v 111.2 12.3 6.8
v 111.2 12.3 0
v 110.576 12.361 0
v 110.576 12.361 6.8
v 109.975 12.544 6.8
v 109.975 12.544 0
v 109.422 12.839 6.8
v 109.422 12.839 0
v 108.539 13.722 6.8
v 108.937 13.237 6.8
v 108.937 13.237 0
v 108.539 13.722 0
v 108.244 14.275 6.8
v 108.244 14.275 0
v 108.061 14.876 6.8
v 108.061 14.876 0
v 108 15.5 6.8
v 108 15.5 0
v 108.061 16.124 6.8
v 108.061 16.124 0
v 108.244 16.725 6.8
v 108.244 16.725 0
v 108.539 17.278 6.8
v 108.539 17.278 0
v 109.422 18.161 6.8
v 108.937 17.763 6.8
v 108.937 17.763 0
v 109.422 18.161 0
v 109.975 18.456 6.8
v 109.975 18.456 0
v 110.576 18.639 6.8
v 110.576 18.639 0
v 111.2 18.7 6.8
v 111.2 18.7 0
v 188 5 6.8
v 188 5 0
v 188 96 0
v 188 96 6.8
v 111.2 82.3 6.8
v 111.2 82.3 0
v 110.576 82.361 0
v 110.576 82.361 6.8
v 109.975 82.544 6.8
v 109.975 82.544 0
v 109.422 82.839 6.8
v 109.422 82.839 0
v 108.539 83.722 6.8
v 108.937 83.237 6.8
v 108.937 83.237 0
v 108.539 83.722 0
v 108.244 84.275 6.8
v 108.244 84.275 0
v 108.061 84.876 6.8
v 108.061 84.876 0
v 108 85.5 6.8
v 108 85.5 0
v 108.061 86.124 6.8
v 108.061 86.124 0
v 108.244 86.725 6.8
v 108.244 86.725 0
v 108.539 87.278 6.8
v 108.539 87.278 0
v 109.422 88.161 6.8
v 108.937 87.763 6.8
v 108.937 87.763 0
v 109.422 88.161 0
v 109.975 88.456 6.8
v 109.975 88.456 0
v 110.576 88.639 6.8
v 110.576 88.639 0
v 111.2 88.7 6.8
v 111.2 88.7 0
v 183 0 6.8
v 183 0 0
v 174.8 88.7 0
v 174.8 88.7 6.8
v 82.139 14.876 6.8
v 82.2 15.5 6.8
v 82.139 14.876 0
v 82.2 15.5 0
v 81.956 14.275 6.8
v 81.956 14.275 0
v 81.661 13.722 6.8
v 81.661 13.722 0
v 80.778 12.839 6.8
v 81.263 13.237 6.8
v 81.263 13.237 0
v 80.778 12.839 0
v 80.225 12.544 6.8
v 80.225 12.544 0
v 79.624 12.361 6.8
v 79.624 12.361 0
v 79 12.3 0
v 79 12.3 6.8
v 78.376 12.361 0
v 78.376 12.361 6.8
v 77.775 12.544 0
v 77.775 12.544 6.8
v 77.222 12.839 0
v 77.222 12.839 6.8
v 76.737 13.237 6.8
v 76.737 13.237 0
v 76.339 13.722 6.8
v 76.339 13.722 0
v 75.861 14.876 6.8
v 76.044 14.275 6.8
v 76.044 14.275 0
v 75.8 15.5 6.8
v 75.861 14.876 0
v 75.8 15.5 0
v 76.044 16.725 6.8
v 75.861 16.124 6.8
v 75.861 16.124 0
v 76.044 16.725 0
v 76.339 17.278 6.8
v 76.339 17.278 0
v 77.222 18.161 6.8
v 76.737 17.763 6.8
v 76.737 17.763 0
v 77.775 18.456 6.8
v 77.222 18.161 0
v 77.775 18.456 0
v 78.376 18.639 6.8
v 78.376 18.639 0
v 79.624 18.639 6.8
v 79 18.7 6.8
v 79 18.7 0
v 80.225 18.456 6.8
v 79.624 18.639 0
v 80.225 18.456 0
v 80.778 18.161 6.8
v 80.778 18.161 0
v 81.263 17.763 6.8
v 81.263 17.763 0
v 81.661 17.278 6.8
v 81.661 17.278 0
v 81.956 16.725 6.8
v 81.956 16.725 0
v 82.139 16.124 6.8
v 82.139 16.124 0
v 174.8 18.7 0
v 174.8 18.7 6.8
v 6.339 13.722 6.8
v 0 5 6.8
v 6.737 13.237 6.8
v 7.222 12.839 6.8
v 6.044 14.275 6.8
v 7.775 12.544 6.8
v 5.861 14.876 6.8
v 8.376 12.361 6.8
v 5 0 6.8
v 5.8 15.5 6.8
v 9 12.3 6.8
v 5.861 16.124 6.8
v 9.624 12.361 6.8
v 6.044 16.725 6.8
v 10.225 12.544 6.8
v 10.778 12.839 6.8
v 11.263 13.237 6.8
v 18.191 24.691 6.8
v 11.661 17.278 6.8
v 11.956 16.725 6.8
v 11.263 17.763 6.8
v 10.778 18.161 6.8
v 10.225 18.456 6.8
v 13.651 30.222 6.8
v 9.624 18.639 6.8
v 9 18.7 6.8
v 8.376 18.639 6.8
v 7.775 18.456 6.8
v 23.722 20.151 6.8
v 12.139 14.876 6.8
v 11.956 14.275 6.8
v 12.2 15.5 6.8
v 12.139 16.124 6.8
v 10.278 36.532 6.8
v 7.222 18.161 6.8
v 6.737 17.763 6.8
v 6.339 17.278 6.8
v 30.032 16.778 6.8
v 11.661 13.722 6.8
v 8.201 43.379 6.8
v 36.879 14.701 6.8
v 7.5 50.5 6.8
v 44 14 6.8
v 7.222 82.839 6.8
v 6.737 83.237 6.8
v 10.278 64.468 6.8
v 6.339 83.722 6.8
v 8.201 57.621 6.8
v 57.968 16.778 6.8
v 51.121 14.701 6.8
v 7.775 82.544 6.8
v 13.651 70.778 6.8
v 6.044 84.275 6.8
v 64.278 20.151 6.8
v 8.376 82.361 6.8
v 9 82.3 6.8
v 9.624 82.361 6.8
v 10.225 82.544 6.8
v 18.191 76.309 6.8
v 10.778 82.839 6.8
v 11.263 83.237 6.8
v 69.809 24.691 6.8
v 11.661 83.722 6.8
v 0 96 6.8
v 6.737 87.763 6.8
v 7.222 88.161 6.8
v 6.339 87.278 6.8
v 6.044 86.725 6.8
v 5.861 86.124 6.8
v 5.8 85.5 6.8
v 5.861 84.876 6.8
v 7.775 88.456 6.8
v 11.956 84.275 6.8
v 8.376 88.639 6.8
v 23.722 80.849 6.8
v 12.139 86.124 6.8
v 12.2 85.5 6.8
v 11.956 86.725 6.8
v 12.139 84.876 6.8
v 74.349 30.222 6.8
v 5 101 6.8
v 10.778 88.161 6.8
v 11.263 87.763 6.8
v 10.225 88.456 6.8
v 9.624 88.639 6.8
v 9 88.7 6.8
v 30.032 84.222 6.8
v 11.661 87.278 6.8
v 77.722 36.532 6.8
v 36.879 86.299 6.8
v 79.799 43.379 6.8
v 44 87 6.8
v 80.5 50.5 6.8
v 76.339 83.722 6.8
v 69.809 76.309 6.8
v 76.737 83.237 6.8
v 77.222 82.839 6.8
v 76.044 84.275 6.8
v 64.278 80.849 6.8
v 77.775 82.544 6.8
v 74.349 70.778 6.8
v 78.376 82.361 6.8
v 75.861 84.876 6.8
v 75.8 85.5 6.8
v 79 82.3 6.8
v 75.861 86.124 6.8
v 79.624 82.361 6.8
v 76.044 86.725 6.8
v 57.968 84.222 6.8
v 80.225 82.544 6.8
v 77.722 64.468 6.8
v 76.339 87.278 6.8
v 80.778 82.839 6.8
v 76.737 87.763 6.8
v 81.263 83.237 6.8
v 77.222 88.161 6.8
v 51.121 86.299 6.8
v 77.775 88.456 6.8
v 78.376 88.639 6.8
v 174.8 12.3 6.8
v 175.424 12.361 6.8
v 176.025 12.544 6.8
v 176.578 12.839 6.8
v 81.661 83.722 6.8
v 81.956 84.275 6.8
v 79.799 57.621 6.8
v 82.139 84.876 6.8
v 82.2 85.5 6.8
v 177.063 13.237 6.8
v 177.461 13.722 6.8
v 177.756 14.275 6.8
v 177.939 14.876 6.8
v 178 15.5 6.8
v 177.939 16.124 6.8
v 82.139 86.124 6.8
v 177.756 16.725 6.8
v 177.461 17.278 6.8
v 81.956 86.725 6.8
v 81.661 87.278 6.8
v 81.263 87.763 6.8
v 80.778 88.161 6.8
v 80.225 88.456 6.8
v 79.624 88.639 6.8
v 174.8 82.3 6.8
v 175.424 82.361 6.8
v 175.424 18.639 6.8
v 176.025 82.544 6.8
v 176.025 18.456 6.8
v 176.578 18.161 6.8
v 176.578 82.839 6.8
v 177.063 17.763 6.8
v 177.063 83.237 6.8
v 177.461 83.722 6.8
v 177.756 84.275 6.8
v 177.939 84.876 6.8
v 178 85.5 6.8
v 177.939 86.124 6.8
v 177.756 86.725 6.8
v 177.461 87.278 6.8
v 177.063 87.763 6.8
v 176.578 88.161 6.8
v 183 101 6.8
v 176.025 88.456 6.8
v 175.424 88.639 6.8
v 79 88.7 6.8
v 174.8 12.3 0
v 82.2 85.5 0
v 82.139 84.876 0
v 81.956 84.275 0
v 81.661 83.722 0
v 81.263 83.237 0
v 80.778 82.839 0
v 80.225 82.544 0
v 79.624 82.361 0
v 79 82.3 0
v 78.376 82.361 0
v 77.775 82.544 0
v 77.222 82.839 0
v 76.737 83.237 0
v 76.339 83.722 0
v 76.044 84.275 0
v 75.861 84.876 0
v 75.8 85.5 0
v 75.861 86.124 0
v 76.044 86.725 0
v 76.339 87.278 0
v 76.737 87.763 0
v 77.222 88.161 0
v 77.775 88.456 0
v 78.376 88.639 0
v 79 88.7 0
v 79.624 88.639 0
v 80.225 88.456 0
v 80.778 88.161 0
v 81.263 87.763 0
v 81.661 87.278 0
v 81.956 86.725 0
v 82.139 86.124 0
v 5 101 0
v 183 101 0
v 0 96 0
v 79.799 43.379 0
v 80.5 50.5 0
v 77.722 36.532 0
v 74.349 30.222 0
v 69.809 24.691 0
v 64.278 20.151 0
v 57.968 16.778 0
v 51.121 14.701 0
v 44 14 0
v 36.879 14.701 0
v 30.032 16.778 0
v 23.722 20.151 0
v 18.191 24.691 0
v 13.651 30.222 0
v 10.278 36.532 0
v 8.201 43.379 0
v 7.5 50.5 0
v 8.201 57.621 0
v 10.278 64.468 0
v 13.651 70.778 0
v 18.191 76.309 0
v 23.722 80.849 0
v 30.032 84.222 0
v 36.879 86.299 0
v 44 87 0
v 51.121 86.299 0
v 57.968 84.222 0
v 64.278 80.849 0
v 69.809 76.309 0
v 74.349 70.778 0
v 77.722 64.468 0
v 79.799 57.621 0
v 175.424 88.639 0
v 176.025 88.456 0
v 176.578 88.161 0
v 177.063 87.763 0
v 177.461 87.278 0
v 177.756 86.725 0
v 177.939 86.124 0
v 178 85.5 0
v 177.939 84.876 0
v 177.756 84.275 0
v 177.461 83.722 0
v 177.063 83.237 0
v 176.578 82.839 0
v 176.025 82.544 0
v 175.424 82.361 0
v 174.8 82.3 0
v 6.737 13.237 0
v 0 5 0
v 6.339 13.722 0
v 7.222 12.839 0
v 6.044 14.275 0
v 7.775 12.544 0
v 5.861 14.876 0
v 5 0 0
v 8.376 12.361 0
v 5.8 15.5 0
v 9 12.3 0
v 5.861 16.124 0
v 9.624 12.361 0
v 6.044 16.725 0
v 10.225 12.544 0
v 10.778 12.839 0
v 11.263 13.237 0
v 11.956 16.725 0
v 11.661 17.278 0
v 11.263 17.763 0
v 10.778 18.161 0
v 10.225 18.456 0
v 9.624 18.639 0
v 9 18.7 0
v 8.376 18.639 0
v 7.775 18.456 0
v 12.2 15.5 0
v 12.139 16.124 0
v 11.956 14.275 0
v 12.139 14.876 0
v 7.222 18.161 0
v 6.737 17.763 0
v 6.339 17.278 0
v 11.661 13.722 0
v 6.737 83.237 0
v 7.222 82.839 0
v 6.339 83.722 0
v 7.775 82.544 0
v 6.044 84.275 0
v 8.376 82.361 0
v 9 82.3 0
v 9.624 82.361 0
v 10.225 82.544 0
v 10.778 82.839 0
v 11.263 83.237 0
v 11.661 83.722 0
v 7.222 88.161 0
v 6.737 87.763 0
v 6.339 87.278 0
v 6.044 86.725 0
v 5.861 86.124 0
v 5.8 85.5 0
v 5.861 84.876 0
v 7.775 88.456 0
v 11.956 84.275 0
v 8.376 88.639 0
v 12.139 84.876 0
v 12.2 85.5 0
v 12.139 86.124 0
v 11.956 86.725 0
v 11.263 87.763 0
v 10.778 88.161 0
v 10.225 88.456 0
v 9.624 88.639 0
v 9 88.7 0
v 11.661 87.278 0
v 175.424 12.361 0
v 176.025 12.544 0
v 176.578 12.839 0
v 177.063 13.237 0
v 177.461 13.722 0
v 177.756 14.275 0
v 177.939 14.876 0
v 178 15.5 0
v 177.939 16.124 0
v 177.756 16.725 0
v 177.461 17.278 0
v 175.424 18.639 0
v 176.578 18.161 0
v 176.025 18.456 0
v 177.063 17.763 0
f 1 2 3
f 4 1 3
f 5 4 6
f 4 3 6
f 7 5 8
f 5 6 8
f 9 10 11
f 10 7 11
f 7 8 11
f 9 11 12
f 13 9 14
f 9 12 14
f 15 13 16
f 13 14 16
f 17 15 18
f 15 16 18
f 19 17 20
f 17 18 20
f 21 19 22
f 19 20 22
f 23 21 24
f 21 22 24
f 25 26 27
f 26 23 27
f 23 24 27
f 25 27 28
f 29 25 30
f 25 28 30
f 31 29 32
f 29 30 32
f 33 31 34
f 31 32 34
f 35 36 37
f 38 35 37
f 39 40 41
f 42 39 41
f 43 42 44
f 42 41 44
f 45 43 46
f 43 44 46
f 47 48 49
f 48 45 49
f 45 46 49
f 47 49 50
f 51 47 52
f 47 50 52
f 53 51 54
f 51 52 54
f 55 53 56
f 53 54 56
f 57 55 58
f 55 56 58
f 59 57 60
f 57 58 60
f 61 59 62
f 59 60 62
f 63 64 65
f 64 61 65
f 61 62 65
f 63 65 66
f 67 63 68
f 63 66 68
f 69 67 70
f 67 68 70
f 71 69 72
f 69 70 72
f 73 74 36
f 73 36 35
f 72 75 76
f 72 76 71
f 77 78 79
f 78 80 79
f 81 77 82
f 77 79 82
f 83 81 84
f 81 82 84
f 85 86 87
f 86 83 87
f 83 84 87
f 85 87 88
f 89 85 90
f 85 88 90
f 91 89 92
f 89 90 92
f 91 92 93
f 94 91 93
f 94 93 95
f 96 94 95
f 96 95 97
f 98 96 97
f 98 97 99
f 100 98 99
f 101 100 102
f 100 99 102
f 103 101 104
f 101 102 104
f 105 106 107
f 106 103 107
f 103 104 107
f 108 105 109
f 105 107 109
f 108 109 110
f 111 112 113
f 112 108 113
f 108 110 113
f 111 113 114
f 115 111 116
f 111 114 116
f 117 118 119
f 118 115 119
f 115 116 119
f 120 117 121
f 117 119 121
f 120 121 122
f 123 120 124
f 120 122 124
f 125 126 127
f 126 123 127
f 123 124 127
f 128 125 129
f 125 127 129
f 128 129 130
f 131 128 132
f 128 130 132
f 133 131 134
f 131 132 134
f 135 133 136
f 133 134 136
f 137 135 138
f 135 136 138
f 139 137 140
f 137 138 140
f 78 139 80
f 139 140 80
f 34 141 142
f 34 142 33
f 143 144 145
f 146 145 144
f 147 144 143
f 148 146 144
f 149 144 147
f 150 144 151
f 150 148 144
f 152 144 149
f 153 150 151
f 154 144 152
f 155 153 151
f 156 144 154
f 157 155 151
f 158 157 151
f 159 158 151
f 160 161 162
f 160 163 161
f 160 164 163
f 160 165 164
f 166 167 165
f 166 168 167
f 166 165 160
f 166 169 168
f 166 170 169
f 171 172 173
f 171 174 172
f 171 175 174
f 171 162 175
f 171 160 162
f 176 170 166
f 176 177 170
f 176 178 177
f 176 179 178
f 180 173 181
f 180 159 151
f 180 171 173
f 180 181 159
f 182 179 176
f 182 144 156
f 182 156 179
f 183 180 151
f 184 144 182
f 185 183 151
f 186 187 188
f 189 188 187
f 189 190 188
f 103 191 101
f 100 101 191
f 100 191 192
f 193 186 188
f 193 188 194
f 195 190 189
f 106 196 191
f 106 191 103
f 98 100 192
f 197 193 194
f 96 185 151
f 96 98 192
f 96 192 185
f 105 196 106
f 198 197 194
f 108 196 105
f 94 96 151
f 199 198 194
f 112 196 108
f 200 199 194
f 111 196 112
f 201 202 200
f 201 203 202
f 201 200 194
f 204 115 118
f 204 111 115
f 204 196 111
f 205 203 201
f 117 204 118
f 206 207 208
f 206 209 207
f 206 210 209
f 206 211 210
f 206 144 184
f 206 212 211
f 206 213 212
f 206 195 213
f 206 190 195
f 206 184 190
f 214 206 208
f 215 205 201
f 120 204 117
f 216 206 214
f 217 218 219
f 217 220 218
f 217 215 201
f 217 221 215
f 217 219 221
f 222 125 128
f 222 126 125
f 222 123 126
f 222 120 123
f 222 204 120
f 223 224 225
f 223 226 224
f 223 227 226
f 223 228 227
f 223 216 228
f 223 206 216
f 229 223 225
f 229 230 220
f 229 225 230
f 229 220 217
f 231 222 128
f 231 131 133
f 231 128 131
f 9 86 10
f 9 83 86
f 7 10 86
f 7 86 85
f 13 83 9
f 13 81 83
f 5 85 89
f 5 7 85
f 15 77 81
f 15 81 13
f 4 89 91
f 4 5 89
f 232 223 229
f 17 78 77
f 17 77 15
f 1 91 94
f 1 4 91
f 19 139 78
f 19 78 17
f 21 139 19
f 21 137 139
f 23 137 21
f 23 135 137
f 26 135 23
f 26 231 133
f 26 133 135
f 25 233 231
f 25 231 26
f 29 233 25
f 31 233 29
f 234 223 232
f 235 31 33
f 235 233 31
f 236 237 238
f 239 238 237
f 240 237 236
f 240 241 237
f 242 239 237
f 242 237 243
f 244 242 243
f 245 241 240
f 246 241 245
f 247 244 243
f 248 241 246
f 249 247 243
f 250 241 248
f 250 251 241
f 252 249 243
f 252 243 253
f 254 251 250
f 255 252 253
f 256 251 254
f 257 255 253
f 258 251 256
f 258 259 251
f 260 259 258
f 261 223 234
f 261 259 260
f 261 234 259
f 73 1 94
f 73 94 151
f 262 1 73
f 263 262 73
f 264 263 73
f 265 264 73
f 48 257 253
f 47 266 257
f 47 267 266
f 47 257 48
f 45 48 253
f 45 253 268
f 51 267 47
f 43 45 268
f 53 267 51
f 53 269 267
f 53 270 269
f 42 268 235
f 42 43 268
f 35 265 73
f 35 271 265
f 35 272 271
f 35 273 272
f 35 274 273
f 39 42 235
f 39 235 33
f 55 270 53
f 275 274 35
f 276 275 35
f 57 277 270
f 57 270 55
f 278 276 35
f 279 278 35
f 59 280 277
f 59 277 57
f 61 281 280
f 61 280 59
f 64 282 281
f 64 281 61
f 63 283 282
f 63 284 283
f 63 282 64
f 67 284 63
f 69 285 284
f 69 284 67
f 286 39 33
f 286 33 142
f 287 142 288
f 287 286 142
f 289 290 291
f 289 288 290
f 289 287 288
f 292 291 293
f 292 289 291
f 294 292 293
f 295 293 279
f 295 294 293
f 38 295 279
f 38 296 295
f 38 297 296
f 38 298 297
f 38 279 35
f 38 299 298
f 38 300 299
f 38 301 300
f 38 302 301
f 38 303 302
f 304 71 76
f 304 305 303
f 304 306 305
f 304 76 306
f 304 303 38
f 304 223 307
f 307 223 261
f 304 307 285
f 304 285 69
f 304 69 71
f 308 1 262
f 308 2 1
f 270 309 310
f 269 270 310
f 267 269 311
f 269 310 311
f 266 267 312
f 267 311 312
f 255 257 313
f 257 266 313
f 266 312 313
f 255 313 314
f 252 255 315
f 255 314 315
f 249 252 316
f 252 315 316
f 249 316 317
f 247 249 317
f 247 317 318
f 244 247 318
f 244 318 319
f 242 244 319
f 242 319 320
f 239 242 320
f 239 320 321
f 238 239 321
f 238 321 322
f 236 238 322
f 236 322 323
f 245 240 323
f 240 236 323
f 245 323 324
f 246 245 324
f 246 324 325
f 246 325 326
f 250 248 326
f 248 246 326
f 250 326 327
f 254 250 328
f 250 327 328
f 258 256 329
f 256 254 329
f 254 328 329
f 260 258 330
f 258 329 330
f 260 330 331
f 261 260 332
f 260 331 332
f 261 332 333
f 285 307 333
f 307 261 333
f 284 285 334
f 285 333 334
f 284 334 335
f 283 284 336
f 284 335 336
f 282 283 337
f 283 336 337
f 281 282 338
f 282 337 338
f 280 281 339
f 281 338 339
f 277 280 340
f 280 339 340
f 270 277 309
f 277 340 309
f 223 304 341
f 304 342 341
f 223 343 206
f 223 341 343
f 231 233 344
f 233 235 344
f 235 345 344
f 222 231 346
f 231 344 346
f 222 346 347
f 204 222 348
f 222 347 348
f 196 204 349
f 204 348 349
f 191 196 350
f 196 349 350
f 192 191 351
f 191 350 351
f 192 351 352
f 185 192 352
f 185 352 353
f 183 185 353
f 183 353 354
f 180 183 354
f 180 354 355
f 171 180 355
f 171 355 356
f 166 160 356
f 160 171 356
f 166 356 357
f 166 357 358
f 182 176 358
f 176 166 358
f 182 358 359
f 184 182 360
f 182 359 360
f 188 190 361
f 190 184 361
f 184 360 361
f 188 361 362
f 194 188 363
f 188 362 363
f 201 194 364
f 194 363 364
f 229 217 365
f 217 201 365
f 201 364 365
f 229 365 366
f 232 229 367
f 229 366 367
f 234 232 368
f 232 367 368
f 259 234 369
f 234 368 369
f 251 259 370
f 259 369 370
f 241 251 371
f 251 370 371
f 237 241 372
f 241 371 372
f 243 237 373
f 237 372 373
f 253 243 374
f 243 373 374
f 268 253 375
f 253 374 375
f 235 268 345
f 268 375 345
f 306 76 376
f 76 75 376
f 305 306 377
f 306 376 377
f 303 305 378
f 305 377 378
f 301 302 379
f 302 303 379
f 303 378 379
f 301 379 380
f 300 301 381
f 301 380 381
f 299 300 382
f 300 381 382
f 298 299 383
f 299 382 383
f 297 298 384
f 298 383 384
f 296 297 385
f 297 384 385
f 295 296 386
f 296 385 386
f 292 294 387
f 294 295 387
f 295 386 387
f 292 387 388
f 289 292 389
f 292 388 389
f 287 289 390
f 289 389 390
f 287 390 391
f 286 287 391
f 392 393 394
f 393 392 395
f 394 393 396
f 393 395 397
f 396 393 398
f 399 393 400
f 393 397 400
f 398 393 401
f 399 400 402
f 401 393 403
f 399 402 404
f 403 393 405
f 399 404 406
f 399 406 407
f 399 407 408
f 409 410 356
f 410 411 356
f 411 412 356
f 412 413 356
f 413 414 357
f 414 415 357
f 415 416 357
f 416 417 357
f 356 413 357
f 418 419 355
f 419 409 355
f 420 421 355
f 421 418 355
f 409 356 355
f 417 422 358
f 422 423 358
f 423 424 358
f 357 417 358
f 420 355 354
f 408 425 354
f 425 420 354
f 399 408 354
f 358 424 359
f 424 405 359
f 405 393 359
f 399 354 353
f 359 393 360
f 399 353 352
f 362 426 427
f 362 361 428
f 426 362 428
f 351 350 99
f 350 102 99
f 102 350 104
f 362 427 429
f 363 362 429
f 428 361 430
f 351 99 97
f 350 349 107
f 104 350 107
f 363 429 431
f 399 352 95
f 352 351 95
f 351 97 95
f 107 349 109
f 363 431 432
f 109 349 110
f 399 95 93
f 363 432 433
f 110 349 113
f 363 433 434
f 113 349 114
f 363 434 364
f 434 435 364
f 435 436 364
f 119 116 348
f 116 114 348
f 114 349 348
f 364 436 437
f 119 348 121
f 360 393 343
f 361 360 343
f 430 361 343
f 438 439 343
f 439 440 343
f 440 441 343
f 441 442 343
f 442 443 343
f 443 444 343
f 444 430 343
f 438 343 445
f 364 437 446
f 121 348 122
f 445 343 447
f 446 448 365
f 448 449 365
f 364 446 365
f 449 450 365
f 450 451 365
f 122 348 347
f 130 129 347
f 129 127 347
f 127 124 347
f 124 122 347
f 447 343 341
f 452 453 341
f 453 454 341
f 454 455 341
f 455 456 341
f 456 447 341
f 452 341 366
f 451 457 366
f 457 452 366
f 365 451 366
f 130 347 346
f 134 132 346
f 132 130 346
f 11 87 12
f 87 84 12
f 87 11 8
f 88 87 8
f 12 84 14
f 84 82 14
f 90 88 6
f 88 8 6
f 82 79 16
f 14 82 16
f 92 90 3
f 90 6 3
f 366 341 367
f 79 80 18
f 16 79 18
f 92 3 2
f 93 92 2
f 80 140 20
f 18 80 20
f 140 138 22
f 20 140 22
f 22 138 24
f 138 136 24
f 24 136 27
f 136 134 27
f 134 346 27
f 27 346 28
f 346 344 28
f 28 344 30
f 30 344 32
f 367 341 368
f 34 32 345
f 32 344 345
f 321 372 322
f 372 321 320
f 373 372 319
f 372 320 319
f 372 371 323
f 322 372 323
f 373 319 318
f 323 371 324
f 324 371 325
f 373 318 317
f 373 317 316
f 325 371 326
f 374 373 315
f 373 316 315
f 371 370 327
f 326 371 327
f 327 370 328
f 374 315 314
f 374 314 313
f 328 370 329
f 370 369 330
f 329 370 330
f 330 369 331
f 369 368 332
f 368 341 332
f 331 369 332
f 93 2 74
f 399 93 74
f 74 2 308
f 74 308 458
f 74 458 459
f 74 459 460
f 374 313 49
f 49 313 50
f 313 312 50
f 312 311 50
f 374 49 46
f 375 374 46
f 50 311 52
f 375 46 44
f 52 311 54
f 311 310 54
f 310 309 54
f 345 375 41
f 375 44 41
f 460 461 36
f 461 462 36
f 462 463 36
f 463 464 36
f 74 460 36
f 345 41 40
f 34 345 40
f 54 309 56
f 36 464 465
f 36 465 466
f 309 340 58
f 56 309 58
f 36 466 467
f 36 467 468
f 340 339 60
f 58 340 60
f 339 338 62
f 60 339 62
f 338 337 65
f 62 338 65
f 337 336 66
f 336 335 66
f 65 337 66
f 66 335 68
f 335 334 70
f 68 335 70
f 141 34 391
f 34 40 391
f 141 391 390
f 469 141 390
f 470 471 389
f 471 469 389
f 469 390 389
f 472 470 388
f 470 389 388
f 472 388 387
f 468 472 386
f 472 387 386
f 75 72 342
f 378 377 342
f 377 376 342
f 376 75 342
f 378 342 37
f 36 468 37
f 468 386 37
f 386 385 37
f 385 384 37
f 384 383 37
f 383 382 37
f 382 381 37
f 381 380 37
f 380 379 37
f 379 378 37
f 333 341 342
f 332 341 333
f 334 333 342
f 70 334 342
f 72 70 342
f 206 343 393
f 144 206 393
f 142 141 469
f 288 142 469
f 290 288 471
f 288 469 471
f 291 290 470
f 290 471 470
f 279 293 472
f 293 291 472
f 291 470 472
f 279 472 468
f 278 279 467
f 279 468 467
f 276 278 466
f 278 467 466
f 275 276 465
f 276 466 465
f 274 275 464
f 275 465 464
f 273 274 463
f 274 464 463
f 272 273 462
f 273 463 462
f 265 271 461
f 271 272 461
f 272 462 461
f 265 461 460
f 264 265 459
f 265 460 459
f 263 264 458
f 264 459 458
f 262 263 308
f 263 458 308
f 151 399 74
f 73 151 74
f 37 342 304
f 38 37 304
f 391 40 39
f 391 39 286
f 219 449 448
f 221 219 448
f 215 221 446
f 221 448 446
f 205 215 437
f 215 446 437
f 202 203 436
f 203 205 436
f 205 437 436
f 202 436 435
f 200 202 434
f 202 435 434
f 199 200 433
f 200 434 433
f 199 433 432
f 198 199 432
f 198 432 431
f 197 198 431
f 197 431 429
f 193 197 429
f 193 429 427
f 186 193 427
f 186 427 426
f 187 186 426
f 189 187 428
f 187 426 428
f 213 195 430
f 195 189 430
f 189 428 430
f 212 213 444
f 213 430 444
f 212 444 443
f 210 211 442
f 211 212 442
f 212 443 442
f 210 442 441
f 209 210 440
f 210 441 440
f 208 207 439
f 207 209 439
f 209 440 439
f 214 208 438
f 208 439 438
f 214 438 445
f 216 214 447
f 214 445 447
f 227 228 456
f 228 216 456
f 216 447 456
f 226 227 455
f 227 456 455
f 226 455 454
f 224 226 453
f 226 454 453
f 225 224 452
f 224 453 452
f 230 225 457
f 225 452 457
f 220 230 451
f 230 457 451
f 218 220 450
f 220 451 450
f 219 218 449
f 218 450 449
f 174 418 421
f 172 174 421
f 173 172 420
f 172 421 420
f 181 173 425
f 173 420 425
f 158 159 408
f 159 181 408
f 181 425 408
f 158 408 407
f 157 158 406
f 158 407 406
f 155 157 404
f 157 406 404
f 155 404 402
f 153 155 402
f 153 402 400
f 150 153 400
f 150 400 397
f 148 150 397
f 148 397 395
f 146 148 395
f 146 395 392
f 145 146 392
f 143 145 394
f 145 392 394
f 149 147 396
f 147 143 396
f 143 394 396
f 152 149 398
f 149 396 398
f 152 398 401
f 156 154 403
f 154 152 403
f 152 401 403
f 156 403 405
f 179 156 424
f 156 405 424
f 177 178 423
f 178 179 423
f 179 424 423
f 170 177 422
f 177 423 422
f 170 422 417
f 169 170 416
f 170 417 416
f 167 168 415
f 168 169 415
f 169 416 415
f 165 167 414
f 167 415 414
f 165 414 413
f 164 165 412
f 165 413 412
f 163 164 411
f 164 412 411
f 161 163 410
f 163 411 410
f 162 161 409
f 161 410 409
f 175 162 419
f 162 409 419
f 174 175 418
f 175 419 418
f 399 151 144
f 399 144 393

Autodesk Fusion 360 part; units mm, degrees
sketch "Sketch1" plane through (0, 0, 0) normal (0, 0, 1) x (1, 0, 0)
  line L0 (0, 0) -> (188, 0)
  line L1 (188, 0) -> (188, 101)
  line L2 (188, 101) -> (0, 101)
  line L3 (0, 101) -> (0, 0)
  circle A0 centre (44, 50.5) radius 36.5
  line L4 (0, 50.5) -> (188, 50.5) construction
  line L5 (9, 85.5) -> (79, 85.5) construction
  line L6 (79, 85.5) -> (79, 15.5) construction
  line L7 (79, 15.5) -> (9, 15.5) construction
  line L8 (9, 15.5) -> (9, 85.5) construction
  circle A1 centre (9, 85.5) radius 3.2
  circle A2 centre (79, 85.5) radius 3.2
  circle A3 centre (79, 15.5) radius 3.2
  circle A4 centre (9, 15.5) radius 3.2
  line L9 (111.2, 12.3) -> (174.8, 12.3)
  arc A5 (174.8, 12.3) -> (174.8, 18.7) centre (174.8, 15.5) ccw
  line L10 (174.8, 18.7) -> (111.2, 18.7)
  arc A6 (111.2, 18.7) -> (111.2, 12.3) centre (111.2, 15.5) ccw
  line L11 (111.2, 15.5) -> (174.8, 15.5) construction
  line L12 (111.2, 82.3) -> (174.8, 82.3)
  arc A7 (174.8, 82.3) -> (174.8, 88.7) centre (174.8, 85.5) ccw
  line L13 (174.8, 88.7) -> (111.2, 88.7)
  arc A8 (111.2, 88.7) -> (111.2, 82.3) centre (111.2, 85.5) ccw
  line L14 (111.2, 85.5) -> (174.8, 85.5) construction
  point P0 (44, 85.5)
  point P1 (9, 50.5)
  point P2 (178, 85.5)
  point P3 (108, 85.5)
  dimension "d1" = 188
  dimension "d2" = 101
  dimension "d3" = 73
  dimension "d4" = 70
  dimension "d5" = 6.4
  dimension "d6" = 9
  dimension "d7" = 10
  dimension "d8" = 70
extrude "Extrude1" add sketch "Sketch1" along normal blind 6.8
chamfer "Chamfer1" distance 5 angle 45 4 edges at (188, 101, 3.4) (188, 0, 3.4) (0, 0, 3.4) (0, 101, 3.4)
